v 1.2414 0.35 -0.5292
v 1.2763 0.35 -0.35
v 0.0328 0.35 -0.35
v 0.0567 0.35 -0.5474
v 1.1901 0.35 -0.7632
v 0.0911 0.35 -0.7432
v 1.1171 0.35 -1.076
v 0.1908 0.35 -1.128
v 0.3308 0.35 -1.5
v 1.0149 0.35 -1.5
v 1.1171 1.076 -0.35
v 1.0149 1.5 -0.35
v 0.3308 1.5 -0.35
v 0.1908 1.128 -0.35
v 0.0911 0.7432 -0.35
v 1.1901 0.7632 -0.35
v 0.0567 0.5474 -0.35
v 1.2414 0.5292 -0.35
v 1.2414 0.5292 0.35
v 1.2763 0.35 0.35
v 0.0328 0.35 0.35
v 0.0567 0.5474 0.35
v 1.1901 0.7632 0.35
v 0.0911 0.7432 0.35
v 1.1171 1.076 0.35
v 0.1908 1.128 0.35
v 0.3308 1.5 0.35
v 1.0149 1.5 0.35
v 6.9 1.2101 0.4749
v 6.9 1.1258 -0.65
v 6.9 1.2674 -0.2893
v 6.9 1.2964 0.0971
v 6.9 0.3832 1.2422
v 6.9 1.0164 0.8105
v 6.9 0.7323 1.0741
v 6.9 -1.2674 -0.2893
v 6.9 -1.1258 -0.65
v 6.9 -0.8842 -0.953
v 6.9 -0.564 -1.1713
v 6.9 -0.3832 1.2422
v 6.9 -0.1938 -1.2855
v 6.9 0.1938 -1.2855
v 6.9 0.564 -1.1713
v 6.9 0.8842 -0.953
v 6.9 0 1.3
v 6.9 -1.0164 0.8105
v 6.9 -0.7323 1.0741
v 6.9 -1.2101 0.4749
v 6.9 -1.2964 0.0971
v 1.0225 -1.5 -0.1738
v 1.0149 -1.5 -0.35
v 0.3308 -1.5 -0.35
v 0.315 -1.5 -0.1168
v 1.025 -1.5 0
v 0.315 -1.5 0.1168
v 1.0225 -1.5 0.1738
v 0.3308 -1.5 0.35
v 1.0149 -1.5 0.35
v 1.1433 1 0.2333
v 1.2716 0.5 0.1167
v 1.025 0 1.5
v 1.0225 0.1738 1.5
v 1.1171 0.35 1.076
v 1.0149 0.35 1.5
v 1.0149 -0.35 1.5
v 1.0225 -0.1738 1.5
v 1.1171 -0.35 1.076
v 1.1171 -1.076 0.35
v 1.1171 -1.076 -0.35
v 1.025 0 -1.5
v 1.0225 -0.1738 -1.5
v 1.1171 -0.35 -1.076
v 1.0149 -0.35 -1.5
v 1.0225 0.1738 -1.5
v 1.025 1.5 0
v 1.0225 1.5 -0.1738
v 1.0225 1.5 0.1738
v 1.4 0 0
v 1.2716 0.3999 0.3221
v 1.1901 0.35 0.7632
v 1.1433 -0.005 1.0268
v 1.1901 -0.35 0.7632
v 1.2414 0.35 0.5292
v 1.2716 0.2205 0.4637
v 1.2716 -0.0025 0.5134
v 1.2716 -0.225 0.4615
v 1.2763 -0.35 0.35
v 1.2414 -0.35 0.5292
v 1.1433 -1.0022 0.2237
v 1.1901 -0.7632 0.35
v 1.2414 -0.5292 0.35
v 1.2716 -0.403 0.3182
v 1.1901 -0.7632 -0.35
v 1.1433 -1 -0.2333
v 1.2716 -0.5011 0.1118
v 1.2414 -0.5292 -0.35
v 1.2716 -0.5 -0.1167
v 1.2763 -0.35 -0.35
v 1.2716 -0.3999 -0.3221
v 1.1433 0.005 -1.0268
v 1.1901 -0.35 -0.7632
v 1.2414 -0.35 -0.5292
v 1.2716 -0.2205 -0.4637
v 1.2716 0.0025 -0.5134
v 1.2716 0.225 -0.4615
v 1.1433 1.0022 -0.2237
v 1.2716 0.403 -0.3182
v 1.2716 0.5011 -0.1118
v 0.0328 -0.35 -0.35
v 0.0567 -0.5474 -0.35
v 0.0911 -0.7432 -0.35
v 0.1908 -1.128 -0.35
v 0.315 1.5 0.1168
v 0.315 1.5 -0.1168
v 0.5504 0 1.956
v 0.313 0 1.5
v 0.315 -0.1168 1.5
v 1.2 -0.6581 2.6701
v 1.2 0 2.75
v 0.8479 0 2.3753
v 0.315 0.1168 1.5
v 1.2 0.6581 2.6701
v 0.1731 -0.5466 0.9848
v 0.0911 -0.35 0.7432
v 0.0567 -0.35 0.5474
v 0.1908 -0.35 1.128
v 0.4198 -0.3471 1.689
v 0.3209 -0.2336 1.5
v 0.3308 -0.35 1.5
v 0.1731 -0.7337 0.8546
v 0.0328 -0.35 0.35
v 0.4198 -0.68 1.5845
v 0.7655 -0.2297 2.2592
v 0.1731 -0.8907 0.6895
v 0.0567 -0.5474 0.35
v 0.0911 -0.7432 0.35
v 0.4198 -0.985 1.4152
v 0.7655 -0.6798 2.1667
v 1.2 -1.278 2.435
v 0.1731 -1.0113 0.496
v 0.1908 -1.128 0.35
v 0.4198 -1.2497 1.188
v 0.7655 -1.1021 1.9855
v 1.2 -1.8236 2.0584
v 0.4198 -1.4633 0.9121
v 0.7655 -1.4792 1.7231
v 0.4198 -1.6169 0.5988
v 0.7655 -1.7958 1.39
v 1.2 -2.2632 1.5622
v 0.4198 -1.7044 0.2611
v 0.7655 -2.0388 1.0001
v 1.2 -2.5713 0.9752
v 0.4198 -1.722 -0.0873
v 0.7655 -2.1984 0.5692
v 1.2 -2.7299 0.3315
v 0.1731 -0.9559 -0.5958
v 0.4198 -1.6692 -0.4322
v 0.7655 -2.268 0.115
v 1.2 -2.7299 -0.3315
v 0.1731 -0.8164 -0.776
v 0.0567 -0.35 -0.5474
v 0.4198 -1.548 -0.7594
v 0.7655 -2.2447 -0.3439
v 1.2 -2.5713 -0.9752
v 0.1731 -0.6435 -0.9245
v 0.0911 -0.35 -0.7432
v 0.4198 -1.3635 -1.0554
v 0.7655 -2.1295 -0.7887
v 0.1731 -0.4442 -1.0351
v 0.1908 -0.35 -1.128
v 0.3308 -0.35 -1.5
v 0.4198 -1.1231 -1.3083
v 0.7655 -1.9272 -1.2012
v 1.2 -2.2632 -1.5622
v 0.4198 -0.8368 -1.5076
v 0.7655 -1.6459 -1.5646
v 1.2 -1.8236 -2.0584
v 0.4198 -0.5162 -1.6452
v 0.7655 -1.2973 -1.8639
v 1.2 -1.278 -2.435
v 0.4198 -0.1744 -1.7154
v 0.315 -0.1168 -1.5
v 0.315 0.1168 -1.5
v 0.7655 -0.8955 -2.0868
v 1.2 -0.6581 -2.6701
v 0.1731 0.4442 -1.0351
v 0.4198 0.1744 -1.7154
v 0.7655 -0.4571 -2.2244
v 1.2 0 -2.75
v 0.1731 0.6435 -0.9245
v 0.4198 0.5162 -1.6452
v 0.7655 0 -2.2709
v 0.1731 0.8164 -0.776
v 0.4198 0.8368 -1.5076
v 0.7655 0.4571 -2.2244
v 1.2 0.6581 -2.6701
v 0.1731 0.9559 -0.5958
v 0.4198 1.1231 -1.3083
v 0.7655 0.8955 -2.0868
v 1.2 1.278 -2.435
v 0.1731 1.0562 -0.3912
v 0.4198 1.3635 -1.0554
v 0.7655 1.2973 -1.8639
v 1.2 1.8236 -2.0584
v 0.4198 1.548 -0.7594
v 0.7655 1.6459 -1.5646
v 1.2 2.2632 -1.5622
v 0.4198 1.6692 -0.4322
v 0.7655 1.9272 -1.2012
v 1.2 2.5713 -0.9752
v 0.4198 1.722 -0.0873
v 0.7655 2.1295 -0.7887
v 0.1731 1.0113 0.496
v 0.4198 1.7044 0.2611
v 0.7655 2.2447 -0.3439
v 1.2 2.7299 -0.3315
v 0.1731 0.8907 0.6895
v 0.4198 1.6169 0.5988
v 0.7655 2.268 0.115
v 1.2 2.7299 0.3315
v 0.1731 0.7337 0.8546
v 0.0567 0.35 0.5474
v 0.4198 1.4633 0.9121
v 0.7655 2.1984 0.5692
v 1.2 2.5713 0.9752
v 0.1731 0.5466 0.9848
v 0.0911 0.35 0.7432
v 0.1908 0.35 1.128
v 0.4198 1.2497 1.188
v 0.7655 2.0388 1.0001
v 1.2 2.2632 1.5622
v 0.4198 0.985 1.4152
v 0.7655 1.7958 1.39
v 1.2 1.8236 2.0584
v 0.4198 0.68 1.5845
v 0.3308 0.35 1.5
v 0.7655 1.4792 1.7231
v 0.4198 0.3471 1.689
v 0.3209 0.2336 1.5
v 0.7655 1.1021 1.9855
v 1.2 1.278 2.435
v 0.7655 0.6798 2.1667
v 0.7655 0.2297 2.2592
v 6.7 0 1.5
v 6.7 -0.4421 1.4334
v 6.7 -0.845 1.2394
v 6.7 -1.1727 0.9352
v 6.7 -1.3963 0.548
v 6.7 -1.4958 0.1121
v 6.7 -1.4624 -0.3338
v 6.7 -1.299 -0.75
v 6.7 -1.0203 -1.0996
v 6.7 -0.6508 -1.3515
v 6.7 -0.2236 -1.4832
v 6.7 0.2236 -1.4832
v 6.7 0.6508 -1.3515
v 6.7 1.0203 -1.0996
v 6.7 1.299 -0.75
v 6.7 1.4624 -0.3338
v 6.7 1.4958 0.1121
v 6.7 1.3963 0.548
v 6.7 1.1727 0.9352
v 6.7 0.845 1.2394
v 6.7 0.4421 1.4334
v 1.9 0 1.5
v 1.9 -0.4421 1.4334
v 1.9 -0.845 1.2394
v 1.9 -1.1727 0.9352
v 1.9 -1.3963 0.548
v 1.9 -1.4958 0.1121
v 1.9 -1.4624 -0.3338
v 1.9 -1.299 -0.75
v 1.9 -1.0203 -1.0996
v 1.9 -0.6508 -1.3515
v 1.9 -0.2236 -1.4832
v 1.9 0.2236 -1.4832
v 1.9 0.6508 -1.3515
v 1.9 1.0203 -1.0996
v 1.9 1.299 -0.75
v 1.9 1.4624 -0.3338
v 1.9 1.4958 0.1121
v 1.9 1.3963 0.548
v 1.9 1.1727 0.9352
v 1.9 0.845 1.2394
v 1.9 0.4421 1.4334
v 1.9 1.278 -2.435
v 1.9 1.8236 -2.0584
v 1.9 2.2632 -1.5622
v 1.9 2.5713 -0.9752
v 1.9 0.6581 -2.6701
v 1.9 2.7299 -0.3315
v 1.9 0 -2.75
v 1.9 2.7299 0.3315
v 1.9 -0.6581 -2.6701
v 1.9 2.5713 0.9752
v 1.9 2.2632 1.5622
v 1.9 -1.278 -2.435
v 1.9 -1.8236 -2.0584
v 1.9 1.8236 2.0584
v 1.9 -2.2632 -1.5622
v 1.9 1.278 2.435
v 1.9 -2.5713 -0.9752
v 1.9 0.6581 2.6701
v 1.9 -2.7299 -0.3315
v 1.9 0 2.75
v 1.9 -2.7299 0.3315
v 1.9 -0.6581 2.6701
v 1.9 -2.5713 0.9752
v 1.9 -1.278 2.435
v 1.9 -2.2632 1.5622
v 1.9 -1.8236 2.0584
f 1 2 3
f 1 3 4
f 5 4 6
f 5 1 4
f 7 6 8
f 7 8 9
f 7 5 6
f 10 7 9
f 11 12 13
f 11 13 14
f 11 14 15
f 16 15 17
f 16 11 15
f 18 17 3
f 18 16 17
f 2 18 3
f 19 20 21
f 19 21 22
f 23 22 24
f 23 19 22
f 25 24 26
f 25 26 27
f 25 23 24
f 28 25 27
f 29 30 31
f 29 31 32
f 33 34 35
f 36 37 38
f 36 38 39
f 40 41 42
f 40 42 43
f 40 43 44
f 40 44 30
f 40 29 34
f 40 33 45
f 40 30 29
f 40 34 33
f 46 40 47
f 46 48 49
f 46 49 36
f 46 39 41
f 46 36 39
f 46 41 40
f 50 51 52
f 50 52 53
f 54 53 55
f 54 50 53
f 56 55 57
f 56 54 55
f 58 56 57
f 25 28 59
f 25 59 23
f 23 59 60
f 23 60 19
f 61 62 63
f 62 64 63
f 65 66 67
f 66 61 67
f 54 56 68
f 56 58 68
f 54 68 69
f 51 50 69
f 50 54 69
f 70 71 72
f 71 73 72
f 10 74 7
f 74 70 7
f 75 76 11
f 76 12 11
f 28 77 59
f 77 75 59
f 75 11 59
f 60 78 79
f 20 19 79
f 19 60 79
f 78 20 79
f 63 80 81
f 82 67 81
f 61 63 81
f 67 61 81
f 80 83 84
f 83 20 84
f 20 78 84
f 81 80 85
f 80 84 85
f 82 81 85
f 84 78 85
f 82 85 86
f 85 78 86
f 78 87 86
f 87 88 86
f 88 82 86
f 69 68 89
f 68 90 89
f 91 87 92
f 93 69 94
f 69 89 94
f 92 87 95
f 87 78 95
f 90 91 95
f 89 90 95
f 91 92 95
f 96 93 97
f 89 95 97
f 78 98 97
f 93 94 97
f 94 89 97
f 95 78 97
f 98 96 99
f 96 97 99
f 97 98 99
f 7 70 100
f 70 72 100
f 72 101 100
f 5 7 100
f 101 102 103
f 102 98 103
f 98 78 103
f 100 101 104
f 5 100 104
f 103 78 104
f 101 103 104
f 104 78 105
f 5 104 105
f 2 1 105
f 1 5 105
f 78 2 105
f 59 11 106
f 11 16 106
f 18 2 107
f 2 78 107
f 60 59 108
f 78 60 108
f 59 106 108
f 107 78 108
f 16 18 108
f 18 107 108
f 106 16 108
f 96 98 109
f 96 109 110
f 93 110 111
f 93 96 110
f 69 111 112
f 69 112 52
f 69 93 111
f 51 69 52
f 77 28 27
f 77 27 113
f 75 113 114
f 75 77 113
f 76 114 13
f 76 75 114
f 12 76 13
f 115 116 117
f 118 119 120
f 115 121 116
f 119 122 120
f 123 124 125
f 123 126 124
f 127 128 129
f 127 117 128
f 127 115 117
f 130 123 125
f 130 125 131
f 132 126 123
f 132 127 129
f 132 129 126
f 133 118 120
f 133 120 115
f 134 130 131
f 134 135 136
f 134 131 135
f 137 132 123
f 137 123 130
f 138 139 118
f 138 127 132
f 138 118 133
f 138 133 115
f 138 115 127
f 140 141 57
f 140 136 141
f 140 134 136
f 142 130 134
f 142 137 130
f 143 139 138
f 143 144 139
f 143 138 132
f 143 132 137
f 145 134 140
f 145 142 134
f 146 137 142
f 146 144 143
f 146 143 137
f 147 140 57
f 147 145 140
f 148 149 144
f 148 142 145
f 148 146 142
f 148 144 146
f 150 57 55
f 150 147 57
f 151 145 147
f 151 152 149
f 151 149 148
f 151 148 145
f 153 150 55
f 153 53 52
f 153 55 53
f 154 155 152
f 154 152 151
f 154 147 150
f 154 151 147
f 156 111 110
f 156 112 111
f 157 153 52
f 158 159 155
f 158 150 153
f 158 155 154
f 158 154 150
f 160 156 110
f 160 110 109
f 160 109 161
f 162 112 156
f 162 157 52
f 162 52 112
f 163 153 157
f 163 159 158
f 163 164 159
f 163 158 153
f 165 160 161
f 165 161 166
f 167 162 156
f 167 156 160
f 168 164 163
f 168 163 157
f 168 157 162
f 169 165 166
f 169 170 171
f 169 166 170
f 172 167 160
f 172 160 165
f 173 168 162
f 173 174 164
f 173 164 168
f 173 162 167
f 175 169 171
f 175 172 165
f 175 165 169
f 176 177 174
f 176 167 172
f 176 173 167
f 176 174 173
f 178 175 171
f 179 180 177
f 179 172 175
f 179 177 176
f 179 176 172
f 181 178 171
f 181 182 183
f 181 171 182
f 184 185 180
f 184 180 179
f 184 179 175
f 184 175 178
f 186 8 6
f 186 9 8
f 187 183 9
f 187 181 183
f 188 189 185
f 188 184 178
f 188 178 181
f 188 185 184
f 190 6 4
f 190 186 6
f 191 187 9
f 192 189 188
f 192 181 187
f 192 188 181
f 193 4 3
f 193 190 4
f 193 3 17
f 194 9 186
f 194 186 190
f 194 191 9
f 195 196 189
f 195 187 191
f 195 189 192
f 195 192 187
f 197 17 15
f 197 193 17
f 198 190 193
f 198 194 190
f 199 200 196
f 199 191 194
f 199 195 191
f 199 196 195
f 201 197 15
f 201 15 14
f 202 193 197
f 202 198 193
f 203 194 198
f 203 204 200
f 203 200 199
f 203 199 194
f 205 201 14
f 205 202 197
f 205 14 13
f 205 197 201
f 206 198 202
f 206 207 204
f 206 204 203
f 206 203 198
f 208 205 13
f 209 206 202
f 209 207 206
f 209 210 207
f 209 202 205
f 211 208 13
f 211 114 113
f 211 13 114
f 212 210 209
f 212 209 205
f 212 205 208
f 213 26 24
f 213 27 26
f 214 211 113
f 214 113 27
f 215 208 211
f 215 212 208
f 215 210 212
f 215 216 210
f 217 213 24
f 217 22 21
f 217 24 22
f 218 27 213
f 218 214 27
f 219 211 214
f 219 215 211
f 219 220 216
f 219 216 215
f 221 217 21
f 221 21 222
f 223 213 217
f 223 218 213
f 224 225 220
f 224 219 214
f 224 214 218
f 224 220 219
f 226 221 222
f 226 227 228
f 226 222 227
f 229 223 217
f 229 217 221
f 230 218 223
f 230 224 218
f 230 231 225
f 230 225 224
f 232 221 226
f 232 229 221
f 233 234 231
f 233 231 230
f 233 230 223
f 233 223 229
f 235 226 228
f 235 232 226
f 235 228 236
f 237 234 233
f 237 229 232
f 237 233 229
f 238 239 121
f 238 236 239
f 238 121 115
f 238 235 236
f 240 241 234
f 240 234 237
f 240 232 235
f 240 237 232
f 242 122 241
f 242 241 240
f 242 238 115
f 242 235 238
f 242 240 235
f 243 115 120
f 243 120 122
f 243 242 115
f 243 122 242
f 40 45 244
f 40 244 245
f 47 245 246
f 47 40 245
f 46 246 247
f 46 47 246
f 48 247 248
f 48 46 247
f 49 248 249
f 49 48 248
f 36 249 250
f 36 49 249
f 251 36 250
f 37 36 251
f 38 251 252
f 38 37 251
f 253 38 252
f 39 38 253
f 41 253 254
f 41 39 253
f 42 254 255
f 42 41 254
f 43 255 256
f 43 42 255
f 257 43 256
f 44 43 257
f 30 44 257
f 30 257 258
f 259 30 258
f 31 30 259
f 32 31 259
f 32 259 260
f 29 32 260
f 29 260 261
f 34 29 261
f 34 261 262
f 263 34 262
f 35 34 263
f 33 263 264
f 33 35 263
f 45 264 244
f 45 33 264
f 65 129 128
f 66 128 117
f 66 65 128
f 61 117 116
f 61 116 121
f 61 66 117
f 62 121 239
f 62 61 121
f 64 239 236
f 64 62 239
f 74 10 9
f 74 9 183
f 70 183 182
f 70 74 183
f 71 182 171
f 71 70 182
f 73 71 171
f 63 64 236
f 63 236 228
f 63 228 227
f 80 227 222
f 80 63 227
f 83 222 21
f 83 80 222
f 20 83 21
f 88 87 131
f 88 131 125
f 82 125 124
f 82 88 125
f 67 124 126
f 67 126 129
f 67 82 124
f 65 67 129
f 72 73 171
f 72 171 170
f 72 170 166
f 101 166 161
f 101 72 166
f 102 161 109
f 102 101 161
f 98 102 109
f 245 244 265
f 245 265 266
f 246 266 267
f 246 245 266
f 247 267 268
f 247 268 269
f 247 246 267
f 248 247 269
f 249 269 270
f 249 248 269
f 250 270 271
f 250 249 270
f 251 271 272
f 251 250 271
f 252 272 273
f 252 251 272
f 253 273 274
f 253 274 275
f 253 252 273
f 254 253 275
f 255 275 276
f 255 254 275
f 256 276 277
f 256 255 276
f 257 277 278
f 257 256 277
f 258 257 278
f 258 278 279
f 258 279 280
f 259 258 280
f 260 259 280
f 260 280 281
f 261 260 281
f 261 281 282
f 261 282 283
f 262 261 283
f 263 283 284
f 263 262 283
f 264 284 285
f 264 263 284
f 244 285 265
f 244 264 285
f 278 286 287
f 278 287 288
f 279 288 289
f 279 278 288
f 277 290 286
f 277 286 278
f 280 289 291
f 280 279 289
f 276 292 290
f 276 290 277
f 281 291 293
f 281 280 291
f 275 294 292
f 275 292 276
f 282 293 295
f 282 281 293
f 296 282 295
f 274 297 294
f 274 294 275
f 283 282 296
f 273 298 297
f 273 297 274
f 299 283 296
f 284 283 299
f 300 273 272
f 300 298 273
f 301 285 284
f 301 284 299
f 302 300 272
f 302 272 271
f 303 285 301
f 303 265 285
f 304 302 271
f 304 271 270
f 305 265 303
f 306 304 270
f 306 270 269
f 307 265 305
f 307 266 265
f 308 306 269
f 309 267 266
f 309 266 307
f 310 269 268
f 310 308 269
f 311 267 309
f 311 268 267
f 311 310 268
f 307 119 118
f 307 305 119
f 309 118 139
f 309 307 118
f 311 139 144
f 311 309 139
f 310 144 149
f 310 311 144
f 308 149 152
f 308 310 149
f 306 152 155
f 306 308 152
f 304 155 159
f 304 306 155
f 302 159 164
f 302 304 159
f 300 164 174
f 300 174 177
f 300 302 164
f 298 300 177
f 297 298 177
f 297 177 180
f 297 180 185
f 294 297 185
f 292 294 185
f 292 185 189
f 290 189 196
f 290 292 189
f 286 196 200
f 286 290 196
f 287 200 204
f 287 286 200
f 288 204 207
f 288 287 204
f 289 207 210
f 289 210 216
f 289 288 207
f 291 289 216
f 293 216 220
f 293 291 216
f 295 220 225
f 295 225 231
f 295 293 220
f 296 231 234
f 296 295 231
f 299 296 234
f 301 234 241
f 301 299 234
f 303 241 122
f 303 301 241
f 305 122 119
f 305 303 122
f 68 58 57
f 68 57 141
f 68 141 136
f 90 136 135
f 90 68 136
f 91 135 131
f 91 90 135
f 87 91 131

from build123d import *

# Parameters (mm, degrees)
CUT_EXTRUDE_START   = -0.5
CUT_EXTRUDE_1_DEPTH = 6.83442973
CHAMFER_1_SIZE      = 0.2


with BuildPart() as part:
    # 草图1 → 旋转1 (revolve)
    with BuildSketch(Plane.XY, mode=Mode.PRIVATE) as revolve_1_sk:
        with BuildLine():
            Line((1.2, 2.75), (1.9, 2.75))
            Line((1.9, 2.75), (1.9, 1.5))
            Line((1.9, 1.5), (6.9, 1.5))
            Line((6.9, 1.5), (6.9, 0))
            Line((6.9, 0), (0, 0))
            ThreePointArc((0, 0), (0.313064269, 1.500208319), (1.2, 2.75))
        make_face()
    revolve(revolve_1_sk.sketch.rotate(Axis((0, 0, 0), (1, 0, 0)), 90), axis=Axis((0, 0, 0), (1, 0, 0)))

    # 草图2 → 切除-拉伸1 (cut, through all)
    with BuildSketch(Plane(origin=(1.9, 0, 0), x_dir=(0, 0, -1), z_dir=(1, 0, 0)).offset(CUT_EXTRUDE_START)):
        Polygon((0.35, -0.35), (0.35, -1.5), (-0.35, -1.5), (-0.35, -0.35), (-1.5, -0.35), (-1.5, 0.35), (-0.35, 0.35), (-0.35, 1.5), (0.35, 1.5), (0.35, 0.35), (1.5, 0.35), (1.5, -0.35), align=None)
    extrude(amount=-CUT_EXTRUDE_1_DEPTH, mode=Mode.SUBTRACT)

    # 草图3 → 旋转3 (revolve)
    with BuildSketch(Plane.XY, mode=Mode.PRIVATE) as revolve_3_sk:
        Polygon((1.9, 0), (1.9, 2), (0.9, 2), (1.4, 0), align=None)
    revolve(revolve_3_sk.sketch.rotate(Axis((0, 0, 0), (1, 0, 0)), 13.134022306), axis=Axis((0, 0, 0), (1, 0, 0)))

    # 倒角1
    chamfer_1_edges = [part.edges().sort_by_distance(p)[0] for p in [
        (6.9, 0, -1.5),
    ]]
    chamfer(chamfer_1_edges, length=CHAMFER_1_SIZE)


solid = part.part
